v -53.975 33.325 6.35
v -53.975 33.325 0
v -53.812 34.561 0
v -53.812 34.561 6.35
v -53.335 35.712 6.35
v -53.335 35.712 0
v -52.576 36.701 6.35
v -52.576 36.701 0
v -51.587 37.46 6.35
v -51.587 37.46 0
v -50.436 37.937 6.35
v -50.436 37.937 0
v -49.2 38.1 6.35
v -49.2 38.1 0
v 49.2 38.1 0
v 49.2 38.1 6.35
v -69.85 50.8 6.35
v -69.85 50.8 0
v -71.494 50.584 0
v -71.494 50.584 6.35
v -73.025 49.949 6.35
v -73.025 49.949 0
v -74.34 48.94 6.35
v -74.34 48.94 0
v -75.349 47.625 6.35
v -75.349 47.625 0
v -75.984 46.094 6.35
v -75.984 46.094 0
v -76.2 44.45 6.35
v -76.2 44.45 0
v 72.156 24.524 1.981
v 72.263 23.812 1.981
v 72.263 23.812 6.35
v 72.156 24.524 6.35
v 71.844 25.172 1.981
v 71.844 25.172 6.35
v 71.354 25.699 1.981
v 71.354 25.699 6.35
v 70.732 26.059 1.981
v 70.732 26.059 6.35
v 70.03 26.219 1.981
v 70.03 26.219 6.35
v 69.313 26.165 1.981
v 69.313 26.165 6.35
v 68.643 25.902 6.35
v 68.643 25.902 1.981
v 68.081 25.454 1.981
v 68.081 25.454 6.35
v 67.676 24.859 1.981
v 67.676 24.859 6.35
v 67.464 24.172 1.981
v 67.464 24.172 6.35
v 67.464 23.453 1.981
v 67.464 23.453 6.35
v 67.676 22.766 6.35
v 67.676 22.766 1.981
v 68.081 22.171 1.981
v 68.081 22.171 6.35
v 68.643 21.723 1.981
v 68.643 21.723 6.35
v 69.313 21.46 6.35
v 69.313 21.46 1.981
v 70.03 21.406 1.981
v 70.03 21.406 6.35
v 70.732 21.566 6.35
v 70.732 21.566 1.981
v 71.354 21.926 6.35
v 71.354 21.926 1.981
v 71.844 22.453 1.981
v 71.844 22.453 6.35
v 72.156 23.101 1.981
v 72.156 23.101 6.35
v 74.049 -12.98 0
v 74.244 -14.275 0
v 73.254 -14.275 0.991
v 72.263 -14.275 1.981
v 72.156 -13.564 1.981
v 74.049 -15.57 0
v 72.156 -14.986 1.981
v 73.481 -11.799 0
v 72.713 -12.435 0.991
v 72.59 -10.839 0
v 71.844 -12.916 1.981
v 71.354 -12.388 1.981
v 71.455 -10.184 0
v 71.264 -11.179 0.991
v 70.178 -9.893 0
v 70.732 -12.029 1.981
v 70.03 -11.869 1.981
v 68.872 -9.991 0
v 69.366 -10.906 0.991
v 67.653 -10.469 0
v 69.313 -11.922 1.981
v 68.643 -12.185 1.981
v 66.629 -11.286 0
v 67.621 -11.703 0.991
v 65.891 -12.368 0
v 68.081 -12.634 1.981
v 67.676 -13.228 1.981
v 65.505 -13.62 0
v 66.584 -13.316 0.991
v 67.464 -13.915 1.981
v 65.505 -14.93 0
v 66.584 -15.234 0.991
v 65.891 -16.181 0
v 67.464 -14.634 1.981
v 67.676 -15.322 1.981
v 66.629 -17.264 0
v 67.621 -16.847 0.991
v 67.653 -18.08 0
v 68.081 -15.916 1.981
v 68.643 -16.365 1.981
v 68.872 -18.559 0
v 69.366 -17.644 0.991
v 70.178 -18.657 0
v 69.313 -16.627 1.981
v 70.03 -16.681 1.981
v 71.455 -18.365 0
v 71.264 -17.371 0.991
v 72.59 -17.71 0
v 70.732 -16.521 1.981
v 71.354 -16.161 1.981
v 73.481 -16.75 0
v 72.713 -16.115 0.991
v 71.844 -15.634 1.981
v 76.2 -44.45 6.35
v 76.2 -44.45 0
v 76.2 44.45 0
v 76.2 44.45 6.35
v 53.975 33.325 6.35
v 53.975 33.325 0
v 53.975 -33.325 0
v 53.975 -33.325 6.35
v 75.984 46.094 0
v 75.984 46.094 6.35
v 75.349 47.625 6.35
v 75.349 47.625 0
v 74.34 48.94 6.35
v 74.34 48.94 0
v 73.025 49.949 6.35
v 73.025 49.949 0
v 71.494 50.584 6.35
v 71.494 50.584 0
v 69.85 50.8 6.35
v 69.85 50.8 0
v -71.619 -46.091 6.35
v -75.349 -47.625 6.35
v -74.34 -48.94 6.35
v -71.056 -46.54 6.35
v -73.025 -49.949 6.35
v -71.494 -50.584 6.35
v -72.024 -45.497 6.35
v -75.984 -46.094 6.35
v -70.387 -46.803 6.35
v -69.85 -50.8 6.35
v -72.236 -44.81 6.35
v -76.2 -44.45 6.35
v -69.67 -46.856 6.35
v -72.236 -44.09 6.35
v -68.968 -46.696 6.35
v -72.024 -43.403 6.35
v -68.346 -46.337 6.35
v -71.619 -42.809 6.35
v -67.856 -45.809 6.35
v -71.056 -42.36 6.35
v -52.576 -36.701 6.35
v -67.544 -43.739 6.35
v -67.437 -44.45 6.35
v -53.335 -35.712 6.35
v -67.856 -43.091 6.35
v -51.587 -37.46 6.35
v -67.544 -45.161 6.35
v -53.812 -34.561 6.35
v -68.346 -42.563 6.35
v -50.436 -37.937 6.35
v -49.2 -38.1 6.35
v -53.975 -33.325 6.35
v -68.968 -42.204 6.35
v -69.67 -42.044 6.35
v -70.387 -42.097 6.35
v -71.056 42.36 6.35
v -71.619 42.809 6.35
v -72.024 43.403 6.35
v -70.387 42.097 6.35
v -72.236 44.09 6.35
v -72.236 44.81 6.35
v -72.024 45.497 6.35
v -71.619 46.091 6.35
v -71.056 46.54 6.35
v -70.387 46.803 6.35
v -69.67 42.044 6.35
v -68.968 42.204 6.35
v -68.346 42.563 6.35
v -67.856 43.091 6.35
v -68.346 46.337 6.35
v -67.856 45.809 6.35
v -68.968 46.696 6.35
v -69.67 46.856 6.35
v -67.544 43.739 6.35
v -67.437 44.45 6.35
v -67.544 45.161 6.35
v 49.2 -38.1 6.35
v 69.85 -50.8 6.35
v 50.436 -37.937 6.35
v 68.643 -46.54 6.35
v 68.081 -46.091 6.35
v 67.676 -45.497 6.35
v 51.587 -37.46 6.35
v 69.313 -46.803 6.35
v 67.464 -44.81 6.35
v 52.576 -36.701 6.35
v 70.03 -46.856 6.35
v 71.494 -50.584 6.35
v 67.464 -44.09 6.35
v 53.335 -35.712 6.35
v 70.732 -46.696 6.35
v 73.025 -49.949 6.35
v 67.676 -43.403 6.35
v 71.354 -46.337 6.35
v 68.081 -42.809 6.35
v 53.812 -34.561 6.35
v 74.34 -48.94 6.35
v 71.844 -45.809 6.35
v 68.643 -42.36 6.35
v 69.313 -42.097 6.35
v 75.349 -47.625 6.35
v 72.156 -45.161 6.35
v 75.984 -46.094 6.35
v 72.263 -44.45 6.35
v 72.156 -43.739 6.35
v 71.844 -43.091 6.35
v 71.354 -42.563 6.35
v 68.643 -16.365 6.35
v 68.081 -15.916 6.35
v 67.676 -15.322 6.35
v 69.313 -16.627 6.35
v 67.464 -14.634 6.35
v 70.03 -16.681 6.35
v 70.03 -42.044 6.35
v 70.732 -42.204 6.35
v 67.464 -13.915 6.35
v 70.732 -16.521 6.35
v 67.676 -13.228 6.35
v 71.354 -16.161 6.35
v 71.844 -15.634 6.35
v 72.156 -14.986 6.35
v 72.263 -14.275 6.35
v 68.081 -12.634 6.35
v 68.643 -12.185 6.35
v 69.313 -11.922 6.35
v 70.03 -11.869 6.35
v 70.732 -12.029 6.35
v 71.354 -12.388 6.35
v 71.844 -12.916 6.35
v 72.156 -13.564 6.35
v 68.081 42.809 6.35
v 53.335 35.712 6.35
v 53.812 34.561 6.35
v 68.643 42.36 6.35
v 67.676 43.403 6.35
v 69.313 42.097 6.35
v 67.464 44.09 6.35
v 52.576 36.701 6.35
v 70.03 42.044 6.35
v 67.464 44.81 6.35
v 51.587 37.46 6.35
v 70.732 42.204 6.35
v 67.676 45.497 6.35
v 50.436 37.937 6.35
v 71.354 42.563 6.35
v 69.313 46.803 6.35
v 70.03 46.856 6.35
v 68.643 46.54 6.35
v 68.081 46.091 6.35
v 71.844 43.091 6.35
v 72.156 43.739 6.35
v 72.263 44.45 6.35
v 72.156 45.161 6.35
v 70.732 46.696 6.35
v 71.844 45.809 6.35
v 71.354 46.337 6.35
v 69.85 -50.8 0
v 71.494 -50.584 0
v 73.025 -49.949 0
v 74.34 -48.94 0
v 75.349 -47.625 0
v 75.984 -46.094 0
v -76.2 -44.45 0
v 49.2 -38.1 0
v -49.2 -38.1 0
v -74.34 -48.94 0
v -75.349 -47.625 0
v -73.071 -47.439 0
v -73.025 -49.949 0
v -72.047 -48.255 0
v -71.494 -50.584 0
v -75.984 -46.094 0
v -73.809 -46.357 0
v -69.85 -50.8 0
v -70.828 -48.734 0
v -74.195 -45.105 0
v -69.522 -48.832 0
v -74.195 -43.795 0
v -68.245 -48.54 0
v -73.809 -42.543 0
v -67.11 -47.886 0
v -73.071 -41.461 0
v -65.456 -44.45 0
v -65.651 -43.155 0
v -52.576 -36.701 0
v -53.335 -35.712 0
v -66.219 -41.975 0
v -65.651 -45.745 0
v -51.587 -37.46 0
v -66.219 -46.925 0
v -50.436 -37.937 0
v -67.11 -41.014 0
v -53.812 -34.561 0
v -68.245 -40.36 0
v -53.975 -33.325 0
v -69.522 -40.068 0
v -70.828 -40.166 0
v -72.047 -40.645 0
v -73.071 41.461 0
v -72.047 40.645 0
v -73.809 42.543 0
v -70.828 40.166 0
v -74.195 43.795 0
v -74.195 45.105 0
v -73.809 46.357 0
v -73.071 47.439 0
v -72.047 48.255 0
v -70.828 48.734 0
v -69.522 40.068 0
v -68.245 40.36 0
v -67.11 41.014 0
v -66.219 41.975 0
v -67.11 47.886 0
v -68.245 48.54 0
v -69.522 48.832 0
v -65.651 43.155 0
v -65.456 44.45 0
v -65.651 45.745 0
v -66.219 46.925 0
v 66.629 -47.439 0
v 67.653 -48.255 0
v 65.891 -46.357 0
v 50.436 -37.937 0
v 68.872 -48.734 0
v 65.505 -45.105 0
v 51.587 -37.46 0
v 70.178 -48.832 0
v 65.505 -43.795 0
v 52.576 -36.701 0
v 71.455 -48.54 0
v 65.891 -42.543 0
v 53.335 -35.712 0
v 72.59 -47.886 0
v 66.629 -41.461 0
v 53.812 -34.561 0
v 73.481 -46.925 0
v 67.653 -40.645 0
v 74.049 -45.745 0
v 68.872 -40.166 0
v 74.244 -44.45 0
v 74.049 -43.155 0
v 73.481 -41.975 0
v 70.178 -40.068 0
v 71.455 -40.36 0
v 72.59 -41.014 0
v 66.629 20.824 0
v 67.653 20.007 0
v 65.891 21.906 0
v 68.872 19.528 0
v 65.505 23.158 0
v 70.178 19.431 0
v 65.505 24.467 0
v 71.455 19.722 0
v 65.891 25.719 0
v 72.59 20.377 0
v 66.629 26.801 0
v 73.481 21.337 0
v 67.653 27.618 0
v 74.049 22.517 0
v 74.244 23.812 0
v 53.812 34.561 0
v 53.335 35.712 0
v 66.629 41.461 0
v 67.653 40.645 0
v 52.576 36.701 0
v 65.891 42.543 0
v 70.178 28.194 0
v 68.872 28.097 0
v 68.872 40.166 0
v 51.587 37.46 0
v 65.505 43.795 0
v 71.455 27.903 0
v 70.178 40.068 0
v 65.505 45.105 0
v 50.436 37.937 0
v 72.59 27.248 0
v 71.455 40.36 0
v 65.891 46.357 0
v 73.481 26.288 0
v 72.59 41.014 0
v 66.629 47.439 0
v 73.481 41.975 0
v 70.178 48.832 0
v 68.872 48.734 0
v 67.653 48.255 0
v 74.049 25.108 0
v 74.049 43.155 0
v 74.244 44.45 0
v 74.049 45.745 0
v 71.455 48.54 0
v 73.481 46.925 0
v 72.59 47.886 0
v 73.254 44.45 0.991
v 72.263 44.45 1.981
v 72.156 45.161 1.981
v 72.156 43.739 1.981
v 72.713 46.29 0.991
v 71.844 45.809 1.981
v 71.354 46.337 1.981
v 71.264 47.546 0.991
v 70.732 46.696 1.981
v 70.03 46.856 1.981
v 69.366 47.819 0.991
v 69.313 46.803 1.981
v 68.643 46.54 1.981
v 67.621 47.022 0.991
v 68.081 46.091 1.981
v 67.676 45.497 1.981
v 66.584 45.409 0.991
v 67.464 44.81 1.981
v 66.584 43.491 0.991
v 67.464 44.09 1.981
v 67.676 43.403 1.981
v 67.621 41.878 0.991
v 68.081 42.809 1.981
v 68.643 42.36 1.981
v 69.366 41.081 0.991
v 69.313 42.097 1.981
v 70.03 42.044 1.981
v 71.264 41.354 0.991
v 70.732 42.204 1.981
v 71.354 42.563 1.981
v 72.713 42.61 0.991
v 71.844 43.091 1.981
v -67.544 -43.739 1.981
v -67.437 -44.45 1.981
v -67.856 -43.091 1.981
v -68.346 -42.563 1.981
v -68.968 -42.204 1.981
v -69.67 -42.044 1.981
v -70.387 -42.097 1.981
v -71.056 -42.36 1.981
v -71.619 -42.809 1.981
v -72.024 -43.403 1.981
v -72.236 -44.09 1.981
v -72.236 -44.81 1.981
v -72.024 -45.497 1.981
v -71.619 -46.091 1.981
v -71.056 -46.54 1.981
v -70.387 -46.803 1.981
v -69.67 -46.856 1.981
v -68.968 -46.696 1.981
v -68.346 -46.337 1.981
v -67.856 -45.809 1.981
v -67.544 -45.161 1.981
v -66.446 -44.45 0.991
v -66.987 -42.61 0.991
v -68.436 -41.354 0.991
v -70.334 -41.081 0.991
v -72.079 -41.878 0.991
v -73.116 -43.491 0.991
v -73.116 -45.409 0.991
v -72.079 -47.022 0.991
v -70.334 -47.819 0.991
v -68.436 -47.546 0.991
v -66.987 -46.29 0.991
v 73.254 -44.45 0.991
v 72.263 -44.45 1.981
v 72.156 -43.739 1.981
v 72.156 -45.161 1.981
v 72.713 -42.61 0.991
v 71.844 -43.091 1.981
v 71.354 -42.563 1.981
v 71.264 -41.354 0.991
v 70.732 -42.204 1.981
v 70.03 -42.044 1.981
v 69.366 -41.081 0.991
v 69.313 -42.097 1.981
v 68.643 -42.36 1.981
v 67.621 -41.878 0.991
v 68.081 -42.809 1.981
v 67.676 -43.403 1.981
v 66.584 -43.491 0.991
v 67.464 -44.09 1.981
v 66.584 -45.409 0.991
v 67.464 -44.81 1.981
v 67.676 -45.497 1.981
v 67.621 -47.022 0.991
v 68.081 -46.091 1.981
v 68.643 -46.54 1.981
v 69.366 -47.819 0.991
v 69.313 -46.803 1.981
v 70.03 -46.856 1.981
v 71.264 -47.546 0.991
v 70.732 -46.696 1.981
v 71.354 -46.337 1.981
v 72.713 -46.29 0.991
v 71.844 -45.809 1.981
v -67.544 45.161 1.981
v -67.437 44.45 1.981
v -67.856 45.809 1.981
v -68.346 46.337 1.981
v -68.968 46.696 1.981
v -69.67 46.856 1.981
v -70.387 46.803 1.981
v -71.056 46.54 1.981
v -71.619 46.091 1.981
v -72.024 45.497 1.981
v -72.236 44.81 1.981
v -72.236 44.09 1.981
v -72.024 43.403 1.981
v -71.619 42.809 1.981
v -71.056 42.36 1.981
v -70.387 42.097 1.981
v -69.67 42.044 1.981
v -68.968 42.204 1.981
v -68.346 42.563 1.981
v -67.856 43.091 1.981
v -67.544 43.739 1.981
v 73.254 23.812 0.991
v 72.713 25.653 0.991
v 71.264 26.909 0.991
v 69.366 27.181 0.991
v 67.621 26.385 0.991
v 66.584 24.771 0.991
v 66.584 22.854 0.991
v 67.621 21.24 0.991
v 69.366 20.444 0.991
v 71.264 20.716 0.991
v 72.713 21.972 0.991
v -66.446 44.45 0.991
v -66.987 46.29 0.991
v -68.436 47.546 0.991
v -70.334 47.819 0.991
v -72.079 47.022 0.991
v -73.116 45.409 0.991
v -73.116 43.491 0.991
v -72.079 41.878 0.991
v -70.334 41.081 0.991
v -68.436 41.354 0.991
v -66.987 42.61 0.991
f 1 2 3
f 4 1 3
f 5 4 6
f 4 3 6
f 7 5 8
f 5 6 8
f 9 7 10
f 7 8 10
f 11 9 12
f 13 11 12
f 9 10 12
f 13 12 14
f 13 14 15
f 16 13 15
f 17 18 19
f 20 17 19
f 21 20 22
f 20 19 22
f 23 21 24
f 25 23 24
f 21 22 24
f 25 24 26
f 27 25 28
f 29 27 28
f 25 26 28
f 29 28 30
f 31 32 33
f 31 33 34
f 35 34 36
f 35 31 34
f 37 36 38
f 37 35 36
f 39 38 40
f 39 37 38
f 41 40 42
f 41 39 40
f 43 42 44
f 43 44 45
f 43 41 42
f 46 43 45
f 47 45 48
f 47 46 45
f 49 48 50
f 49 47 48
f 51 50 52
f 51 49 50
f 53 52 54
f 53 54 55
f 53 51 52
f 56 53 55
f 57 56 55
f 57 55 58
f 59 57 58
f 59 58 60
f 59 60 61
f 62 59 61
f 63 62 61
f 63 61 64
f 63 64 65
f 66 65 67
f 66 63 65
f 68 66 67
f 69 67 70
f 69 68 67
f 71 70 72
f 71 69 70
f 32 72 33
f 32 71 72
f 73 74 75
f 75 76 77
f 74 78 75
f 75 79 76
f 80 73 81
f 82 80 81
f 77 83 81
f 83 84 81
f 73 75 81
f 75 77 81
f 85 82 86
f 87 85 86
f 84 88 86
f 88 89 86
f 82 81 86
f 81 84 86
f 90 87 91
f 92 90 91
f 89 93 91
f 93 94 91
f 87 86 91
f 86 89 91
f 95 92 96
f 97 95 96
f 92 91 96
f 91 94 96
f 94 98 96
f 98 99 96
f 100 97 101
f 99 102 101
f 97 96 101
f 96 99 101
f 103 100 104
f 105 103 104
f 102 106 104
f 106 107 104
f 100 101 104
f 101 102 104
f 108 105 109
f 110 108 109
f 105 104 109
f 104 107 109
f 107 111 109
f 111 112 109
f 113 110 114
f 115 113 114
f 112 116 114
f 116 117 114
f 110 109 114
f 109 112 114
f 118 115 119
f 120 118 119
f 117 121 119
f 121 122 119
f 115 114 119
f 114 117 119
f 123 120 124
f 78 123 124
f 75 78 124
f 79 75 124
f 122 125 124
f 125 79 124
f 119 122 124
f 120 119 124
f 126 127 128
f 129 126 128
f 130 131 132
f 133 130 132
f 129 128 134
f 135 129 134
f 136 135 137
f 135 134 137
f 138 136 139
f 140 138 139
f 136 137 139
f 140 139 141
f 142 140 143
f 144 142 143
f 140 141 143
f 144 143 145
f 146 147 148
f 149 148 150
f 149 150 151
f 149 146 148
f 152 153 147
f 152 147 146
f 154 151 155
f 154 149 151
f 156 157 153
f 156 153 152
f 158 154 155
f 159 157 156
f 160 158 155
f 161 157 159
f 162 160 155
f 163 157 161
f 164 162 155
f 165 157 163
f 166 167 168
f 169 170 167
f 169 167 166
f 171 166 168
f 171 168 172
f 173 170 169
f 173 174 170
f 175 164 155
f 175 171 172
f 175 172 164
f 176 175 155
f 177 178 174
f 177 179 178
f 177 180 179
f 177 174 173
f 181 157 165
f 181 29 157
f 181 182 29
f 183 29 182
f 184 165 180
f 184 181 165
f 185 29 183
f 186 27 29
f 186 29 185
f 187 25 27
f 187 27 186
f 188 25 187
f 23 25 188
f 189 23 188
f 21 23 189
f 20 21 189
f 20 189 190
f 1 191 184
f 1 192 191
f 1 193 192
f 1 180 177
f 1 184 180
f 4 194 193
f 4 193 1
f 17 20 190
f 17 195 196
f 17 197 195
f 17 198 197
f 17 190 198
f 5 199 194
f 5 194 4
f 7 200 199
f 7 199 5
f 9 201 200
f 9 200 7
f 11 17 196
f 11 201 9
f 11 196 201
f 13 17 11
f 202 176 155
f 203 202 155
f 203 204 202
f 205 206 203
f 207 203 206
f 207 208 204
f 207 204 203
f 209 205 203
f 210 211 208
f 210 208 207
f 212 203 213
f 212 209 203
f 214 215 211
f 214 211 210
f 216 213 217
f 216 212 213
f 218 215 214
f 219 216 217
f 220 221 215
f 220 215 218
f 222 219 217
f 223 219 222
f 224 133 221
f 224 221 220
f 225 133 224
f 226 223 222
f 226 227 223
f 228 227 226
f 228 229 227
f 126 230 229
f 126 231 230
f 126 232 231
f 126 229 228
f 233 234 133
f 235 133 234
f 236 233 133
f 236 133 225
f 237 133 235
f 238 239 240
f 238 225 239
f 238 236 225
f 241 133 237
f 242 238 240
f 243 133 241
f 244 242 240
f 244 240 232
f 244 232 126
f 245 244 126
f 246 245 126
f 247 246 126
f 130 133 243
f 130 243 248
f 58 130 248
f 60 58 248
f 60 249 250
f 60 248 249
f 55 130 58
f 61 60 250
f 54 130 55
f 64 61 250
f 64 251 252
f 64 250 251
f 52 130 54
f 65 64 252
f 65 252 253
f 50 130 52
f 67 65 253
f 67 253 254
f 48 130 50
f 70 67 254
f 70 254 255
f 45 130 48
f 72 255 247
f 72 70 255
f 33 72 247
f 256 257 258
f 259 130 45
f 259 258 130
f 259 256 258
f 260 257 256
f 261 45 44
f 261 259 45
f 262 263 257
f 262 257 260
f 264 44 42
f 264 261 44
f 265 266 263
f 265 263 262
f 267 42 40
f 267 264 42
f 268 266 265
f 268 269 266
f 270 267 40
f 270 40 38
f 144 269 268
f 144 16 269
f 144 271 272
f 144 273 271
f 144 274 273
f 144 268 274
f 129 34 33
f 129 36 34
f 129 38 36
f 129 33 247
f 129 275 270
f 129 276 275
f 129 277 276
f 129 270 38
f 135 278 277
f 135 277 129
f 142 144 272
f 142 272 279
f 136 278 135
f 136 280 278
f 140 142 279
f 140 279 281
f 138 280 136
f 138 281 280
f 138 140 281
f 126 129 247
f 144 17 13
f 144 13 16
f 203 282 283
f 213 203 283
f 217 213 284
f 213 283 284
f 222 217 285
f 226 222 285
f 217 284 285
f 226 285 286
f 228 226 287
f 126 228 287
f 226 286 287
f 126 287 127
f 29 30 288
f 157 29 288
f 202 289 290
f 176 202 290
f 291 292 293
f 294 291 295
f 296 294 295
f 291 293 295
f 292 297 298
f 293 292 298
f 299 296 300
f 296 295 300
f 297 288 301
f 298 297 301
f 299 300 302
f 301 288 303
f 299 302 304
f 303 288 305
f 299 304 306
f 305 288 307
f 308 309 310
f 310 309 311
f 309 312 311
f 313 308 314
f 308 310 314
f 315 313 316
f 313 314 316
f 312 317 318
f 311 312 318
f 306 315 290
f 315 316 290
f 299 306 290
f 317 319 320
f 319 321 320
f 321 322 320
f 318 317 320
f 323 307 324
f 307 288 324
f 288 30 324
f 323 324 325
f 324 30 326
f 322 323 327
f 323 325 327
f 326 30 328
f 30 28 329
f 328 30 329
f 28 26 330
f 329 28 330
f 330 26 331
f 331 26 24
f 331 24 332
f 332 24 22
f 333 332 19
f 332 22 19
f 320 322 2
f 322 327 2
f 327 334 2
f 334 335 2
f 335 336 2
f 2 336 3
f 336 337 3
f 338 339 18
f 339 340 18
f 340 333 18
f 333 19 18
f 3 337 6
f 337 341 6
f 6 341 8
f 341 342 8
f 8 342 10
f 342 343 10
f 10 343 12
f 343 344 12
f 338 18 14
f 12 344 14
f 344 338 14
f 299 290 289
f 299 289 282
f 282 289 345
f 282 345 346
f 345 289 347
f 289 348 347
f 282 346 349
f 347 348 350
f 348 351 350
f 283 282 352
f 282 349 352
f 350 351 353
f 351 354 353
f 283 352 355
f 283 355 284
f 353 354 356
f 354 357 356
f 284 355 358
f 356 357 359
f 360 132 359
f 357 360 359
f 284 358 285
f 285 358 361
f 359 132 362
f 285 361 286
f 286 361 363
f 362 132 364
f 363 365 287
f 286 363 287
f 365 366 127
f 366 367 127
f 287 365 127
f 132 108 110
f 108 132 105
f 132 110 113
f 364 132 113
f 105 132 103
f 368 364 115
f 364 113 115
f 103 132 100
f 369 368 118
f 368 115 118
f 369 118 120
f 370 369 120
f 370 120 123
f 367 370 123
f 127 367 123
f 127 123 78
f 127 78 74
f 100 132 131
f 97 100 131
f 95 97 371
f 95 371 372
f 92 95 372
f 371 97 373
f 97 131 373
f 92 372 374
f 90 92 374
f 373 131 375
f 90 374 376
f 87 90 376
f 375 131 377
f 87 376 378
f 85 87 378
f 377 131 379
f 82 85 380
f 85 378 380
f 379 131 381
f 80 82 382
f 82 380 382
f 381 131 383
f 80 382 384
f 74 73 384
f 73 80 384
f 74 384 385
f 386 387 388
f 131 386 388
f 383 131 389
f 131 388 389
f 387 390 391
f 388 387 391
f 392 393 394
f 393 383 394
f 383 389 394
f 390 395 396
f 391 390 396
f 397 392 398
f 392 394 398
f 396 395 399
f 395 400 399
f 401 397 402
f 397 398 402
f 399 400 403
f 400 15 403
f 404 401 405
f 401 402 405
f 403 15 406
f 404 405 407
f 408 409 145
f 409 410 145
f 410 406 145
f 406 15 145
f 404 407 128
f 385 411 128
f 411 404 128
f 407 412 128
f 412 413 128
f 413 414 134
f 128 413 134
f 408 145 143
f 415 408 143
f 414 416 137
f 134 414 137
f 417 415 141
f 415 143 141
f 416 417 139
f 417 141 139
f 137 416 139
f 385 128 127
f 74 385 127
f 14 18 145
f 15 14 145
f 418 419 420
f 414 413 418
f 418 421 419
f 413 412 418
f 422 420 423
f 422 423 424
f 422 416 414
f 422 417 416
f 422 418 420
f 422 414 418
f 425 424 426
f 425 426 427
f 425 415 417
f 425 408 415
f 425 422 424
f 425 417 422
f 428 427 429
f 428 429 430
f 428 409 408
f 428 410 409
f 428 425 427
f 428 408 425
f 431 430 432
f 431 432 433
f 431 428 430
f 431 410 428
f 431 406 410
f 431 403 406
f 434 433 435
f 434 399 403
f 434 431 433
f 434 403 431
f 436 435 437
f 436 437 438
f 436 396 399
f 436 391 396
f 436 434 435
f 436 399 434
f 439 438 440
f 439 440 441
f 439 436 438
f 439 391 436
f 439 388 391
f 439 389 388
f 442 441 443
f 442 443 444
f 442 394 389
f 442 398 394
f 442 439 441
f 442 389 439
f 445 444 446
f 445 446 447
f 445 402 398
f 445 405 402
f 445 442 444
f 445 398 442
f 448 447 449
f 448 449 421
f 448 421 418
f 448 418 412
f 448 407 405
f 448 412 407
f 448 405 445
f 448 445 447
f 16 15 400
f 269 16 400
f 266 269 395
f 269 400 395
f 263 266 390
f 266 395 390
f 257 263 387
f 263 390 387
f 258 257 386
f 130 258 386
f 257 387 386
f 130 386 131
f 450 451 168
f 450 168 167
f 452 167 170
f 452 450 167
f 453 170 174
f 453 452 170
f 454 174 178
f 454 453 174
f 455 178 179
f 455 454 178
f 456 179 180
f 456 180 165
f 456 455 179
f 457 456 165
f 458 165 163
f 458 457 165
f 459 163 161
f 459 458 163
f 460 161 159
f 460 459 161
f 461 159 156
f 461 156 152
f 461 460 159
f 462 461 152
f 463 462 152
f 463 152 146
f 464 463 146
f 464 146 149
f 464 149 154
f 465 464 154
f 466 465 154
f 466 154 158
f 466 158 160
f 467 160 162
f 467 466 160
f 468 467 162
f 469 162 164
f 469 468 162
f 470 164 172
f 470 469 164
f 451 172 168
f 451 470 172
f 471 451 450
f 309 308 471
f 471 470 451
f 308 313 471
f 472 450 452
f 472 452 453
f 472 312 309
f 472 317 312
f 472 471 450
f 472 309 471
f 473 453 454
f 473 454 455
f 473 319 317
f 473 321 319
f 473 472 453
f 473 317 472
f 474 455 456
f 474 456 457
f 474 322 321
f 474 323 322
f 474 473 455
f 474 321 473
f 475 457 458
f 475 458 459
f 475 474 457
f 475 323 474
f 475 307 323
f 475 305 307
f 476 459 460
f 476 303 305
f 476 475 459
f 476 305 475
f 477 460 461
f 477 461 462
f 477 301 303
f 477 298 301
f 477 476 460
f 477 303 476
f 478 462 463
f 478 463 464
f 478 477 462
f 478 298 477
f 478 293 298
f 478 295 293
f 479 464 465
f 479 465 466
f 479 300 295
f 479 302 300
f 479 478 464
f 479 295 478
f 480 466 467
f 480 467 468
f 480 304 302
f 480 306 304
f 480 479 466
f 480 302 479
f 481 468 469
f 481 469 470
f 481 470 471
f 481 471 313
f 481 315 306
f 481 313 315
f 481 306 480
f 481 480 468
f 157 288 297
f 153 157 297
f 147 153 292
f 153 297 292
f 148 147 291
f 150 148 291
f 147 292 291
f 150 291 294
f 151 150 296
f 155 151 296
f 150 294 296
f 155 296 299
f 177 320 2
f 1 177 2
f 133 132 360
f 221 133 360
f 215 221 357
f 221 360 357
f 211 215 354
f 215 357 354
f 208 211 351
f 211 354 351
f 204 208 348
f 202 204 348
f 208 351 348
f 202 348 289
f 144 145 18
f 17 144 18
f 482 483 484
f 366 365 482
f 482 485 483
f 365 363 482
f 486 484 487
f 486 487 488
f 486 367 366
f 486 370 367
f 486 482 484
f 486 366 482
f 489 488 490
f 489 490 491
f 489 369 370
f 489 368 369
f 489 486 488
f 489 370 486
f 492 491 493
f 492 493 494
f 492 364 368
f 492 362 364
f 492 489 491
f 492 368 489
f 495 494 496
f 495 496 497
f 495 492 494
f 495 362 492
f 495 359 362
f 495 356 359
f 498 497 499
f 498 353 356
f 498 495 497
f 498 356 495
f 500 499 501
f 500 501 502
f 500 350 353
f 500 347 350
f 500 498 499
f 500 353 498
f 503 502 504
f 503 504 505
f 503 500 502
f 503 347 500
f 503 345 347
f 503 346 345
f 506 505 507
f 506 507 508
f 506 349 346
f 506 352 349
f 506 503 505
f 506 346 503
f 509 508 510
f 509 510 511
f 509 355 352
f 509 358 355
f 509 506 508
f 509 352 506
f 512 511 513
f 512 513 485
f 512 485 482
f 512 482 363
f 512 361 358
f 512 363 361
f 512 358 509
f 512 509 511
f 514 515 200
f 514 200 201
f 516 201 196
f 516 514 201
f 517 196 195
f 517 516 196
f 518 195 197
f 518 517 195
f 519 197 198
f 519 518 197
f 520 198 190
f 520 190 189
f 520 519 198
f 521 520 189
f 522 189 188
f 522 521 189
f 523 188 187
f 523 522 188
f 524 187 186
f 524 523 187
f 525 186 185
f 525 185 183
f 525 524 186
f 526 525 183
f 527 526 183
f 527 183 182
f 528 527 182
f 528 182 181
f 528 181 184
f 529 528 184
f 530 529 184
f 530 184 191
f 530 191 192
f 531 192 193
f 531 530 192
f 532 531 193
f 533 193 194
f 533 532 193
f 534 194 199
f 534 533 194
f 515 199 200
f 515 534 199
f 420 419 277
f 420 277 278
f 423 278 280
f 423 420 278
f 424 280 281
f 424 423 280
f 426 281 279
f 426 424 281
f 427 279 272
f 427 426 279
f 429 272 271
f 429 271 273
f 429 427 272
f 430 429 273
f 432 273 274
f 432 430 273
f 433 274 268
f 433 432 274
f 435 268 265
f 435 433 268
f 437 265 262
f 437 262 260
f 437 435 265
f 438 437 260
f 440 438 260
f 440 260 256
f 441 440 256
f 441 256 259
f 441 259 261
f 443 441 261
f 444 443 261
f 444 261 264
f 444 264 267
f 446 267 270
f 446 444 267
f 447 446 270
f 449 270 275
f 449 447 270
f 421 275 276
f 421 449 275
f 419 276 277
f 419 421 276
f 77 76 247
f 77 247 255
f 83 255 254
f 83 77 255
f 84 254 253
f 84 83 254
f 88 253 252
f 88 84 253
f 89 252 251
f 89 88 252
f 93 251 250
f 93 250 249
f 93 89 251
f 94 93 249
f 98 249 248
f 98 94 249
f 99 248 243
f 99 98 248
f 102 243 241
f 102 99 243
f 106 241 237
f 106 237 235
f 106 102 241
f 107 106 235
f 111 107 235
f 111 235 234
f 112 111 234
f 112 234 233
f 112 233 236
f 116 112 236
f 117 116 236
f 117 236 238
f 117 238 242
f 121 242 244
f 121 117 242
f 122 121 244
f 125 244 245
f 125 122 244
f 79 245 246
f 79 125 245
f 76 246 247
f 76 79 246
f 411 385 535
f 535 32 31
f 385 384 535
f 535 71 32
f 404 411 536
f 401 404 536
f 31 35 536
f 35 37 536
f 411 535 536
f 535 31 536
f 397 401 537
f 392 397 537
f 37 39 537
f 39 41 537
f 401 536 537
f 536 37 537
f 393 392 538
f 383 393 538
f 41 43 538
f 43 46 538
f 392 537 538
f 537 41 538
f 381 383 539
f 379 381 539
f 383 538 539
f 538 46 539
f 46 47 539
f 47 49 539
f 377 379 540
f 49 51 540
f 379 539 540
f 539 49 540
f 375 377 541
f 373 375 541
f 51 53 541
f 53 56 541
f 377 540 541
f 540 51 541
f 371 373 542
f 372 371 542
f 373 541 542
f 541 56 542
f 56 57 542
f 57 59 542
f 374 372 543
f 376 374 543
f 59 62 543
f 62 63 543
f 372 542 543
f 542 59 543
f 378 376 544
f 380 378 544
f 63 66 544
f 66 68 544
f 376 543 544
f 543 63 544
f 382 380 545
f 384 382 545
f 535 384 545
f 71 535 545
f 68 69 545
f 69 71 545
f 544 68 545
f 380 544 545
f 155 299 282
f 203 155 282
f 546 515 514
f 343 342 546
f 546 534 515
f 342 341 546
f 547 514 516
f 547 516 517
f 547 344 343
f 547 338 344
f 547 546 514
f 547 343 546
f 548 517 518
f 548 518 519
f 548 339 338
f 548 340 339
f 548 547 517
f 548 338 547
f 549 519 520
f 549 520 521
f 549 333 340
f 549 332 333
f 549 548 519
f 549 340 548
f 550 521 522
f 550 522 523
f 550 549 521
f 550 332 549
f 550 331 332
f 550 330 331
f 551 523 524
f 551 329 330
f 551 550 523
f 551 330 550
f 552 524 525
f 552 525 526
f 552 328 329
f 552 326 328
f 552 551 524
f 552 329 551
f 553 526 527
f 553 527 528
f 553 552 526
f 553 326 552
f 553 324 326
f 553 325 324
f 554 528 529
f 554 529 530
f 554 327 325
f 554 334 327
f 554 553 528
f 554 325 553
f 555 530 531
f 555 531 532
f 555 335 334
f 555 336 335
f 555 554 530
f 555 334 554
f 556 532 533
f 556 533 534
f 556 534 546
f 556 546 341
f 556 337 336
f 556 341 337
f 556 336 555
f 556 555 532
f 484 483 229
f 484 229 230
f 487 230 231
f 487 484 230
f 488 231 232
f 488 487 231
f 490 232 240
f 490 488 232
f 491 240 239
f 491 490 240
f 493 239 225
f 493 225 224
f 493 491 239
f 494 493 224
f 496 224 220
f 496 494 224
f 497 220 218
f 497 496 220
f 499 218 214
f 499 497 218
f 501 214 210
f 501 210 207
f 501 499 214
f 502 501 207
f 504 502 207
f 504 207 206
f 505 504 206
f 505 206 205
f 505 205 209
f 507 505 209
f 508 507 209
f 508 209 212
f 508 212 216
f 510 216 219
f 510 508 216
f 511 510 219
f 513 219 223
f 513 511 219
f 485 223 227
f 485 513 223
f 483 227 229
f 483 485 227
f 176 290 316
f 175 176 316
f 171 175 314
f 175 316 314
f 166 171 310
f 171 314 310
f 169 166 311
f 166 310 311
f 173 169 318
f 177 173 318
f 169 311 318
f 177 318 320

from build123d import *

# Parameters (mm, degrees)
F0_R     = 2.413
F1_DEPTH = 6.35
F2_SIZE  = 1.9812
F3_SIZE  = 1.9812


with BuildPart() as f1:
    # F0 (on Top) → F1 (new body)
    with BuildSketch(Plane.XY):
        with BuildLine():
            ThreePointArc((-76.2, -44.45), (-74.340128, -48.940128), (-69.85, -50.8))
            Line((-69.85, -50.8), (69.85, -50.8))
            ThreePointArc((69.85, -50.8), (74.340128, -48.940128), (76.2, -44.45))
            Line((76.2, -44.45), (76.2, 44.45))
            ThreePointArc((76.2, 44.45), (74.340128, 48.940128), (69.85, 50.8))
            Line((69.85, 50.8), (-69.85, 50.8))
            ThreePointArc((-69.85, 50.8), (-74.340128, 48.940128), (-76.2, 44.45))
            Line((-76.2, 44.45), (-76.2, -44.45))
        make_face()
        with Locations((-69.85, -44.45)):
            Circle(F0_R, mode=Mode.SUBTRACT)
        with Locations((69.85, -44.45)):
            Circle(F0_R, mode=Mode.SUBTRACT)
        with Locations((69.85, -14.2748)):
            Circle(F0_R, mode=Mode.SUBTRACT)
        with Locations((-69.85, 44.45)):
            Circle(F0_R, mode=Mode.SUBTRACT)
        with BuildLine():
            ThreePointArc((-53.975, 33.3248), (-52.576376, 36.701376), (-49.1998, 38.1))
            Line((-49.1998, 38.1), (49.1998, 38.1))
            ThreePointArc((49.1998, 38.1), (52.576376, 36.701376), (53.975, 33.3248))
            Line((53.975, 33.3248), (53.975, -33.3248))
            ThreePointArc((53.975, -33.3248), (52.576376, -36.701376), (49.1998, -38.1))
            Line((49.1998, -38.1), (-49.1998, -38.1))
            ThreePointArc((-49.1998, -38.1), (-52.576376, -36.701376), (-53.975, -33.3248))
            Line((-53.975, -33.3248), (-53.975, 33.3248))
        make_face(mode=Mode.SUBTRACT)
        with Locations((69.85, 23.8125)):
            Circle(F0_R, mode=Mode.SUBTRACT)
        with Locations((69.85, 44.45)):
            Circle(F0_R, mode=Mode.SUBTRACT)
    extrude(amount=F1_DEPTH)

    # F2
    f2_edges = [f1.edges().sort_by_distance(p)[0] for p in [
        (-72.263, 44.45, 0),
        (-72.263, -44.45, 0),
        (67.437, 44.45, 0),
        (67.437, -44.45, 0),
    ]]
    chamfer(f2_edges, length=F2_SIZE)

    # F3
    f3_edges = [f1.edges().sort_by_distance(p)[0] for p in [
        (67.437, 23.8125, 0),
        (67.437, -14.2748, 0),
    ]]
    chamfer(f3_edges, length=F3_SIZE)


solid = f1.part
